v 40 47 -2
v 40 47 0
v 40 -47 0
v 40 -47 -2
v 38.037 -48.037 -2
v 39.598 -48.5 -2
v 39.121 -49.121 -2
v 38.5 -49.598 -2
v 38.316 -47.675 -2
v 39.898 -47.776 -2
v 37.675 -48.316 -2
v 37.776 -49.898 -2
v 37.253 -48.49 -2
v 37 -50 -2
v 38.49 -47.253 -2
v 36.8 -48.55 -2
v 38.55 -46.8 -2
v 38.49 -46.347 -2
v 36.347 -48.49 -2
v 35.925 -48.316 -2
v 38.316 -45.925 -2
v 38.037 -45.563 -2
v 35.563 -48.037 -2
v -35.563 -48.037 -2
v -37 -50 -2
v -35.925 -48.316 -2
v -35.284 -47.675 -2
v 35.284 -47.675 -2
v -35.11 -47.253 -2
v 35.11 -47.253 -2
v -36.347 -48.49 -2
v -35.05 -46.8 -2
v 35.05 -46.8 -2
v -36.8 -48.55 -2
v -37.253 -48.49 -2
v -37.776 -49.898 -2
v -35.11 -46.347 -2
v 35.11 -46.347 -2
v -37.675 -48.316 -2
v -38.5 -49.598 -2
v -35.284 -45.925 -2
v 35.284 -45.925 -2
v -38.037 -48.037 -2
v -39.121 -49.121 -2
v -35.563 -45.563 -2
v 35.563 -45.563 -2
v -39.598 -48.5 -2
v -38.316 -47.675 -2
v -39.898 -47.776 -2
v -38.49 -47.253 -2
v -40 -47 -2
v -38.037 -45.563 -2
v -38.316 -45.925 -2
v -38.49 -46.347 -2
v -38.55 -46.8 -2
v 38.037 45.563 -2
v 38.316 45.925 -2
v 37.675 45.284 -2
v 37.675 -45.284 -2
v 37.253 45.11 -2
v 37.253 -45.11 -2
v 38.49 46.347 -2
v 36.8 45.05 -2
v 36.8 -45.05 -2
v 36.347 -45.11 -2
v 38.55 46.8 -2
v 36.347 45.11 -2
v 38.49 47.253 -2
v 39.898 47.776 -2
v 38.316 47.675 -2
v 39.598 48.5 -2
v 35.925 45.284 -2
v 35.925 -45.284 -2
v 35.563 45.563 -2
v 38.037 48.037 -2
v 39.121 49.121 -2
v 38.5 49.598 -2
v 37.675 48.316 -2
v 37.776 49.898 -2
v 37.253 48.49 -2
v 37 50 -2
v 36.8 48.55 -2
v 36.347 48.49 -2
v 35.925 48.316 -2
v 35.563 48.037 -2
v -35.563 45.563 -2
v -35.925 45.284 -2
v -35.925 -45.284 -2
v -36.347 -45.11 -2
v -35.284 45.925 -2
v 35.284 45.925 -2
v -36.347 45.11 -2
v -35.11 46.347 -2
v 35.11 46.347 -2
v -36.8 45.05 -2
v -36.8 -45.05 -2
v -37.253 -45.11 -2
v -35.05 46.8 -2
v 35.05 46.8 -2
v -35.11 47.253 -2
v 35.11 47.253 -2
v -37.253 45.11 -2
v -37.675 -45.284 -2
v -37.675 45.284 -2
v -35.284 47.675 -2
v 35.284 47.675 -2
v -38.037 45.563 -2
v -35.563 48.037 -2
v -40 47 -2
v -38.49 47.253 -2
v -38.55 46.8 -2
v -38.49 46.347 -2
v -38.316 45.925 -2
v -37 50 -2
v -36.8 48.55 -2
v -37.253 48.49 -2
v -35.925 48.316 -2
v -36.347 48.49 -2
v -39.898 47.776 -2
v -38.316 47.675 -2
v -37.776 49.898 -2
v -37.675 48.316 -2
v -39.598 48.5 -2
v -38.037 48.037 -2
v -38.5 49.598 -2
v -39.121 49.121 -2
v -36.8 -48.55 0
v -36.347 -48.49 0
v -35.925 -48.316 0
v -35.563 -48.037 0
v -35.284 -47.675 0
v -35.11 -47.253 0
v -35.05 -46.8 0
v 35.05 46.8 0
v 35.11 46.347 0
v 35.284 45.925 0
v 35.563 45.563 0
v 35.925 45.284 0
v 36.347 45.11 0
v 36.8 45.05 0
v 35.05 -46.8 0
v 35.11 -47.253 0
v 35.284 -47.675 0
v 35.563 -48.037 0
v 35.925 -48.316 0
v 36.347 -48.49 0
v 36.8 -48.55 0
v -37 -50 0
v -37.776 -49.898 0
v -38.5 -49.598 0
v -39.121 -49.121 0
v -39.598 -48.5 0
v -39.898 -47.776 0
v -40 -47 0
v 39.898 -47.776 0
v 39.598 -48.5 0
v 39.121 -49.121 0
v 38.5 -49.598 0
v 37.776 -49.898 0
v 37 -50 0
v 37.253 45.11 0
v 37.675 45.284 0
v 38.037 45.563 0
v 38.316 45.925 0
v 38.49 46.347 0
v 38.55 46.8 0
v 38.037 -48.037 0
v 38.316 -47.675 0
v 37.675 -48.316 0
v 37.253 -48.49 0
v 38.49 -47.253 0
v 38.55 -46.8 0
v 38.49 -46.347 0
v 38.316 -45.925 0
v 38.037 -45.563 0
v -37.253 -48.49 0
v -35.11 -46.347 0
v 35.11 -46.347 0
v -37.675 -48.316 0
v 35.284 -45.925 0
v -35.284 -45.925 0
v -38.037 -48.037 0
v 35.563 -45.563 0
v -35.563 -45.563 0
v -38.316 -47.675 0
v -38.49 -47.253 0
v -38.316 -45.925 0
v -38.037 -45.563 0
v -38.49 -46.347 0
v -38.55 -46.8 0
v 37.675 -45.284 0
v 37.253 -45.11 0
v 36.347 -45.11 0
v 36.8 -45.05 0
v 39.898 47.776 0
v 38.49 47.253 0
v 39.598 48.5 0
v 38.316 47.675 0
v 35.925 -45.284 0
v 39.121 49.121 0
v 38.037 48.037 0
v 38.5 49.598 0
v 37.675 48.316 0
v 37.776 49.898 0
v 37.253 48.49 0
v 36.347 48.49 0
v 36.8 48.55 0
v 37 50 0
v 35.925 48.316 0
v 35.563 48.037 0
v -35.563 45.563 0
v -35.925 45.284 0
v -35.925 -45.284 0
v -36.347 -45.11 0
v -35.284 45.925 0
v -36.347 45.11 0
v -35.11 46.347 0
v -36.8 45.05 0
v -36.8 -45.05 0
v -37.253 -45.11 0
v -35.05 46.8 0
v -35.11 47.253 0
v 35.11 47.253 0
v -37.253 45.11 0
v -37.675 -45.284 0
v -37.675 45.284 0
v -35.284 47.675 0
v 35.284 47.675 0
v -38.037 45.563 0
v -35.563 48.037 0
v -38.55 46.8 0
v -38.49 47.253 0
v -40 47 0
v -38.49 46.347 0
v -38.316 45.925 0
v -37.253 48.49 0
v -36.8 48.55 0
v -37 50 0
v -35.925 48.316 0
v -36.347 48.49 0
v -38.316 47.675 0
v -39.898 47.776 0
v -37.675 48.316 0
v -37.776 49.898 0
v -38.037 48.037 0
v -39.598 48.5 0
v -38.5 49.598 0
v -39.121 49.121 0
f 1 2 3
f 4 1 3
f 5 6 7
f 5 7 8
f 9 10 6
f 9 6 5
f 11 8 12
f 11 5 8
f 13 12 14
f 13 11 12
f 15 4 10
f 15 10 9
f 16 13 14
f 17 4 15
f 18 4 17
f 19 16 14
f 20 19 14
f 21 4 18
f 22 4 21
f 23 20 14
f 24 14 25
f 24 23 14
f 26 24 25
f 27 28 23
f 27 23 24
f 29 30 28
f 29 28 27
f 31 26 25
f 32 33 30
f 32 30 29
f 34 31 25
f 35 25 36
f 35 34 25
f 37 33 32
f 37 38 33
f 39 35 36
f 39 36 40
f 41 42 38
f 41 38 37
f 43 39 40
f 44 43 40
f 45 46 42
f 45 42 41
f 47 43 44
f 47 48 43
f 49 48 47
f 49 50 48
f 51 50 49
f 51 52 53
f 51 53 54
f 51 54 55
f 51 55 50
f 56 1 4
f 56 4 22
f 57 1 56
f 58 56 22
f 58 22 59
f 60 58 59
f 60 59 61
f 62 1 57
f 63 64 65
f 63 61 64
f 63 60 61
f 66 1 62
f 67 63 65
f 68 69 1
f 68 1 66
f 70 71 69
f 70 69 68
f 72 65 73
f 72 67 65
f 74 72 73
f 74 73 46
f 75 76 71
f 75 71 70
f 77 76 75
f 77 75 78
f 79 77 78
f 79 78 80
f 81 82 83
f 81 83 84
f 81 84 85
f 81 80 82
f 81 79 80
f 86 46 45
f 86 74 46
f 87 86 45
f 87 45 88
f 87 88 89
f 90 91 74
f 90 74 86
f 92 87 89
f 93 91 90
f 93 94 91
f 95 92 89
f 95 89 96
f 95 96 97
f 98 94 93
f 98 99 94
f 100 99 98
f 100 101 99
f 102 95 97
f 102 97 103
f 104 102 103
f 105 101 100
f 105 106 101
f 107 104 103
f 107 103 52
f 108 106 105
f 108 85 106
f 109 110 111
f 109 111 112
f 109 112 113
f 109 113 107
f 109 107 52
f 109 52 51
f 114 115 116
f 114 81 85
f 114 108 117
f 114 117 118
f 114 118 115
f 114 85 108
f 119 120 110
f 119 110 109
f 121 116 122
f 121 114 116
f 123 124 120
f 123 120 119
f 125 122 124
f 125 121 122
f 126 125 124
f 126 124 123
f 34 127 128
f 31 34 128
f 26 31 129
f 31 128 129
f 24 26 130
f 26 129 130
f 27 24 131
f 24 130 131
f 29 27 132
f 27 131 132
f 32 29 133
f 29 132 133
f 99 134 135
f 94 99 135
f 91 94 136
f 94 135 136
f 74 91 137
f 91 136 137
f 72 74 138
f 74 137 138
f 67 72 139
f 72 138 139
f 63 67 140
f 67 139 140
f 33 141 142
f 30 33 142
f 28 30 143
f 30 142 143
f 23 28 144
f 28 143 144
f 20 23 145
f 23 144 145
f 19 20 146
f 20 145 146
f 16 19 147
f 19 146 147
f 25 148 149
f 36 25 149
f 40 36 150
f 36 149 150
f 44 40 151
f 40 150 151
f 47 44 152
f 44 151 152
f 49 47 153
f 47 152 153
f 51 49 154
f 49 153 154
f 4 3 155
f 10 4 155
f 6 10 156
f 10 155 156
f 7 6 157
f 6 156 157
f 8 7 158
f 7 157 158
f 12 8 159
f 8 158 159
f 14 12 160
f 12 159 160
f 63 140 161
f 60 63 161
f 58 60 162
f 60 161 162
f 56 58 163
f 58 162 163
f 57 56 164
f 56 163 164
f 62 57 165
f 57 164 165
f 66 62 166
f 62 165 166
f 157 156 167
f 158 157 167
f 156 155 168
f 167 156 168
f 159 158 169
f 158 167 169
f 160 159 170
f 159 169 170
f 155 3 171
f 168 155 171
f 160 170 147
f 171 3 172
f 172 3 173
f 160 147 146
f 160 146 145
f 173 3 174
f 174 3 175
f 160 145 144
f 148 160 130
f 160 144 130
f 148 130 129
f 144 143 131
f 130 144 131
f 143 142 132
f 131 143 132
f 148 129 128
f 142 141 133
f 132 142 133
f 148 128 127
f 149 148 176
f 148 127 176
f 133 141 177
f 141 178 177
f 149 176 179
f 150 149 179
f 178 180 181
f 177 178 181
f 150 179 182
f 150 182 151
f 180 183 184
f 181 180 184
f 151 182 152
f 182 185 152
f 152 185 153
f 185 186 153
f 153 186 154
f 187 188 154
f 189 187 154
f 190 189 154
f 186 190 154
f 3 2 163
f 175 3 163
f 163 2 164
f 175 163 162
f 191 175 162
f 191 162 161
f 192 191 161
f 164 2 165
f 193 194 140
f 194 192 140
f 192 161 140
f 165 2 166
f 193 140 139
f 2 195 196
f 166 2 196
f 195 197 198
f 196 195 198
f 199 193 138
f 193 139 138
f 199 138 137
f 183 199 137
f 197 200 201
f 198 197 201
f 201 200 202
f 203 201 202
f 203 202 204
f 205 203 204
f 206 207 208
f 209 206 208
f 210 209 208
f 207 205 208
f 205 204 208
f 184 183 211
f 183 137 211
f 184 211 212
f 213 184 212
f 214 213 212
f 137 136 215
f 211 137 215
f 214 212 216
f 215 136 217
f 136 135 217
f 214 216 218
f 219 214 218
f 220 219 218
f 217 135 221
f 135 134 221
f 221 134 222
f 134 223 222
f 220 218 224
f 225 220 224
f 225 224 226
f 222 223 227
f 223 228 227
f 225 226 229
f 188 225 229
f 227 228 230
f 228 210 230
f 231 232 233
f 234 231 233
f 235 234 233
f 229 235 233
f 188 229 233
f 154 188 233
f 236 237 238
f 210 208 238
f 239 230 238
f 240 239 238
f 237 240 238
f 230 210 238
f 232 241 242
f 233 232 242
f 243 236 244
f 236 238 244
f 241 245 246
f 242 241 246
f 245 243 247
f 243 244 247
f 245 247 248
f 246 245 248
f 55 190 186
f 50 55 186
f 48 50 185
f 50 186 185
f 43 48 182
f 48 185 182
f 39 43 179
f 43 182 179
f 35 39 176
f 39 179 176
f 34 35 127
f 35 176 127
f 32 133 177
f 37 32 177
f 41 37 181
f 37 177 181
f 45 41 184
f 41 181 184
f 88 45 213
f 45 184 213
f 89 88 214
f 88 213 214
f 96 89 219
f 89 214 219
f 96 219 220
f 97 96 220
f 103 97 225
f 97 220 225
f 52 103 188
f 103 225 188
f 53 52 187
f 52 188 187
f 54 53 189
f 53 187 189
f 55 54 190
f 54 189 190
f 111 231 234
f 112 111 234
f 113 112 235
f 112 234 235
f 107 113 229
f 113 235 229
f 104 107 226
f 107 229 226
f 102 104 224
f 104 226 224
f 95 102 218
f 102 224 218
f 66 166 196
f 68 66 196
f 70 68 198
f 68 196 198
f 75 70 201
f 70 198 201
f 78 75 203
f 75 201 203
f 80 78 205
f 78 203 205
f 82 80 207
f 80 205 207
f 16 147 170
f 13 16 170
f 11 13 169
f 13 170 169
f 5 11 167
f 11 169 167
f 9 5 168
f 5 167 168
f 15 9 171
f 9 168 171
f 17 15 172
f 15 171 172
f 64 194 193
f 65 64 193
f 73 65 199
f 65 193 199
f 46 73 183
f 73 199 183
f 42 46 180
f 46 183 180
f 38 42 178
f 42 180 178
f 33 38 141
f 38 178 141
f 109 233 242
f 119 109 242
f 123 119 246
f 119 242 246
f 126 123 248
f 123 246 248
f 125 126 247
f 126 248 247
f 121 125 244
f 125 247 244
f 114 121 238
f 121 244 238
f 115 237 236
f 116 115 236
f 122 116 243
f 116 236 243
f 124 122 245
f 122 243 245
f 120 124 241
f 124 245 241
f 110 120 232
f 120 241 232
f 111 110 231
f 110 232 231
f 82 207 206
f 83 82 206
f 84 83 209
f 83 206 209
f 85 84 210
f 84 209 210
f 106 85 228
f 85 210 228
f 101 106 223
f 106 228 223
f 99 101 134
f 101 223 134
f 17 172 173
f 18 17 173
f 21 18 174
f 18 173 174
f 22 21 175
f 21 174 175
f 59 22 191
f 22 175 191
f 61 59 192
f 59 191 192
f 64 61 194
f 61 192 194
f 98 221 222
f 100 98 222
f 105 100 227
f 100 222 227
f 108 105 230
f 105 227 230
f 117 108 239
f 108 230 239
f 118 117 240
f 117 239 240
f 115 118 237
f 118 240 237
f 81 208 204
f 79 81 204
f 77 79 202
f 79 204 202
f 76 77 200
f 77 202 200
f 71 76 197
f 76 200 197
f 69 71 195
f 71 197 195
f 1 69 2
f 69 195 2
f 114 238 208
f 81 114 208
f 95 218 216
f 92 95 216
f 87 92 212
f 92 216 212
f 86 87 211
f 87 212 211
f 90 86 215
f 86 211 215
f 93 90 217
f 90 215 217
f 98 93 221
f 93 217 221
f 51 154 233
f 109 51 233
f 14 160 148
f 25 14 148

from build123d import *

# Parameters (mm, degrees)
EXTRUDE_1_DEPTH     = 2
CUT_EXTRUDE_1_DEPTH = 2


with BuildPart() as part:
    # 草图1 → 凸台-拉伸1 (new body)
    with BuildSketch(Plane.XY):
        with BuildLine():
            Line((-37, 50), (37, 50))
            ThreePointArc((37, 50), (39.121320344, 49.121320344), (40, 47))
            Line((40, 47), (40, -47))
            ThreePointArc((40, -47), (39.121320344, -49.121320344), (37, -50))
            Line((37, -50), (-37, -50))
            ThreePointArc((-37, -50), (-39.121320344, -49.121320344), (-40, -47))
            Line((-40, -47), (-40, 47))
            ThreePointArc((-40, 47), (-39.121320344, 49.121320344), (-37, 50))
        make_face()
    extrude(amount=-EXTRUDE_1_DEPTH)

    # 草图2 → 切除-拉伸1 (cut)
    with BuildSketch(Plane.XY):
        with BuildLine():
            ThreePointArc((-36.8, 48.55), (-38.037436867, 48.037436867), (-38.55, 46.8))
            Line((-38.55, 46.8), (-36.8, 46.8))
            Line((-36.8, 46.8), (-36.8, 48.55))
        make_face()
        with BuildLine():
            Line((-36.8, 46.8), (-38.55, 46.8))
            ThreePointArc((-38.55, 46.8), (-38.037436867, 45.562563133), (-36.8, 45.05))
            Line((-36.8, 45.05), (-36.8, 46.8))
        make_face()
        with BuildLine():
            Line((-36.8, 48.55), (-36.8, 46.8))
            Line((-36.8, 46.8), (-35.05, 46.8))
            ThreePointArc((-35.05, 46.8), (-35.562563133, 48.037436867), (-36.8, 48.55))
        make_face()
        with BuildLine():
            Line((-35.05, 46.8), (-36.8, 46.8))
            Line((-36.8, 46.8), (-36.8, 45.05))
            ThreePointArc((-36.8, 45.05), (-35.562563133, 45.562563133), (-35.05, 46.8))
        make_face()
        with BuildLine():
            ThreePointArc((-35.05, -46.8), (-35.562563133, -45.562563133), (-36.8, -45.05))
            Line((-36.8, -45.05), (-36.8, -46.8))
            Line((-36.8, -46.8), (-35.05, -46.8))
        make_face()
        with BuildLine():
            Line((-36.8, -46.8), (-36.8, -45.05))
            ThreePointArc((-36.8, -45.05), (-38.037436867, -45.562563133), (-38.55, -46.8))
            Line((-38.55, -46.8), (-36.8, -46.8))
        make_face()
        with BuildLine():
            Line((-36.8, -48.55), (-36.8, -46.8))
            Line((-36.8, -46.8), (-38.55, -46.8))
            ThreePointArc((-38.55, -46.8), (-38.037436867, -48.037436867), (-36.8, -48.55))
        make_face()
        with BuildLine():
            Line((-35.05, -46.8), (-36.8, -46.8))
            Line((-36.8, -46.8), (-36.8, -48.55))
            ThreePointArc((-36.8, -48.55), (-35.562563133, -48.037436867), (-35.05, -46.8))
        make_face()
        with BuildLine():
            ThreePointArc((36.8, -45.05), (35.562563133, -45.562563133), (35.05, -46.8))
            Line((35.05, -46.8), (36.8, -46.8))
            Line((36.8, -46.8), (36.8, -45.05))
        make_face()
        with BuildLine():
            Line((36.8, -46.8), (35.05, -46.8))
            ThreePointArc((35.05, -46.8), (35.562563133, -48.037436867), (36.8, -48.55))
            Line((36.8, -48.55), (36.8, -46.8))
        make_face()
        with BuildLine():
            ThreePointArc((38.55, -46.8), (38.037436867, -45.562563133), (36.8, -45.05))
            Line((36.8, -45.05), (36.8, -46.8))
            Line((36.8, -46.8), (38.55, -46.8))
        make_face()
        with BuildLine():
            Line((38.55, -46.8), (36.8, -46.8))
            Line((36.8, -46.8), (36.8, -48.55))
            ThreePointArc((36.8, -48.55), (38.037436867, -48.037436867), (38.55, -46.8))
        make_face()
        with BuildLine():
            ThreePointArc((36.8, 48.55), (35.562563133, 48.037436867), (35.05, 46.8))
            Line((35.05, 46.8), (36.8, 46.8))
            Line((36.8, 46.8), (36.8, 48.55))
        make_face()
        with BuildLine():
            Line((36.8, 46.8), (35.05, 46.8))
            ThreePointArc((35.05, 46.8), (35.562563133, 45.562563133), (36.8, 45.05))
            Line((36.8, 45.05), (36.8, 46.8))
        make_face()
        with BuildLine():
            Line((36.8, 48.55), (36.8, 46.8))
            Line((36.8, 46.8), (38.55, 46.8))
            ThreePointArc((38.55, 46.8), (38.037436867, 48.037436867), (36.8, 48.55))
        make_face()
        with BuildLine():
            Line((38.55, 46.8), (36.8, 46.8))
            Line((36.8, 46.8), (36.8, 45.05))
            ThreePointArc((36.8, 45.05), (38.037436867, 45.562563133), (38.55, 46.8))
        make_face()
    extrude(amount=-CUT_EXTRUDE_1_DEPTH, mode=Mode.SUBTRACT)


solid = part.part
